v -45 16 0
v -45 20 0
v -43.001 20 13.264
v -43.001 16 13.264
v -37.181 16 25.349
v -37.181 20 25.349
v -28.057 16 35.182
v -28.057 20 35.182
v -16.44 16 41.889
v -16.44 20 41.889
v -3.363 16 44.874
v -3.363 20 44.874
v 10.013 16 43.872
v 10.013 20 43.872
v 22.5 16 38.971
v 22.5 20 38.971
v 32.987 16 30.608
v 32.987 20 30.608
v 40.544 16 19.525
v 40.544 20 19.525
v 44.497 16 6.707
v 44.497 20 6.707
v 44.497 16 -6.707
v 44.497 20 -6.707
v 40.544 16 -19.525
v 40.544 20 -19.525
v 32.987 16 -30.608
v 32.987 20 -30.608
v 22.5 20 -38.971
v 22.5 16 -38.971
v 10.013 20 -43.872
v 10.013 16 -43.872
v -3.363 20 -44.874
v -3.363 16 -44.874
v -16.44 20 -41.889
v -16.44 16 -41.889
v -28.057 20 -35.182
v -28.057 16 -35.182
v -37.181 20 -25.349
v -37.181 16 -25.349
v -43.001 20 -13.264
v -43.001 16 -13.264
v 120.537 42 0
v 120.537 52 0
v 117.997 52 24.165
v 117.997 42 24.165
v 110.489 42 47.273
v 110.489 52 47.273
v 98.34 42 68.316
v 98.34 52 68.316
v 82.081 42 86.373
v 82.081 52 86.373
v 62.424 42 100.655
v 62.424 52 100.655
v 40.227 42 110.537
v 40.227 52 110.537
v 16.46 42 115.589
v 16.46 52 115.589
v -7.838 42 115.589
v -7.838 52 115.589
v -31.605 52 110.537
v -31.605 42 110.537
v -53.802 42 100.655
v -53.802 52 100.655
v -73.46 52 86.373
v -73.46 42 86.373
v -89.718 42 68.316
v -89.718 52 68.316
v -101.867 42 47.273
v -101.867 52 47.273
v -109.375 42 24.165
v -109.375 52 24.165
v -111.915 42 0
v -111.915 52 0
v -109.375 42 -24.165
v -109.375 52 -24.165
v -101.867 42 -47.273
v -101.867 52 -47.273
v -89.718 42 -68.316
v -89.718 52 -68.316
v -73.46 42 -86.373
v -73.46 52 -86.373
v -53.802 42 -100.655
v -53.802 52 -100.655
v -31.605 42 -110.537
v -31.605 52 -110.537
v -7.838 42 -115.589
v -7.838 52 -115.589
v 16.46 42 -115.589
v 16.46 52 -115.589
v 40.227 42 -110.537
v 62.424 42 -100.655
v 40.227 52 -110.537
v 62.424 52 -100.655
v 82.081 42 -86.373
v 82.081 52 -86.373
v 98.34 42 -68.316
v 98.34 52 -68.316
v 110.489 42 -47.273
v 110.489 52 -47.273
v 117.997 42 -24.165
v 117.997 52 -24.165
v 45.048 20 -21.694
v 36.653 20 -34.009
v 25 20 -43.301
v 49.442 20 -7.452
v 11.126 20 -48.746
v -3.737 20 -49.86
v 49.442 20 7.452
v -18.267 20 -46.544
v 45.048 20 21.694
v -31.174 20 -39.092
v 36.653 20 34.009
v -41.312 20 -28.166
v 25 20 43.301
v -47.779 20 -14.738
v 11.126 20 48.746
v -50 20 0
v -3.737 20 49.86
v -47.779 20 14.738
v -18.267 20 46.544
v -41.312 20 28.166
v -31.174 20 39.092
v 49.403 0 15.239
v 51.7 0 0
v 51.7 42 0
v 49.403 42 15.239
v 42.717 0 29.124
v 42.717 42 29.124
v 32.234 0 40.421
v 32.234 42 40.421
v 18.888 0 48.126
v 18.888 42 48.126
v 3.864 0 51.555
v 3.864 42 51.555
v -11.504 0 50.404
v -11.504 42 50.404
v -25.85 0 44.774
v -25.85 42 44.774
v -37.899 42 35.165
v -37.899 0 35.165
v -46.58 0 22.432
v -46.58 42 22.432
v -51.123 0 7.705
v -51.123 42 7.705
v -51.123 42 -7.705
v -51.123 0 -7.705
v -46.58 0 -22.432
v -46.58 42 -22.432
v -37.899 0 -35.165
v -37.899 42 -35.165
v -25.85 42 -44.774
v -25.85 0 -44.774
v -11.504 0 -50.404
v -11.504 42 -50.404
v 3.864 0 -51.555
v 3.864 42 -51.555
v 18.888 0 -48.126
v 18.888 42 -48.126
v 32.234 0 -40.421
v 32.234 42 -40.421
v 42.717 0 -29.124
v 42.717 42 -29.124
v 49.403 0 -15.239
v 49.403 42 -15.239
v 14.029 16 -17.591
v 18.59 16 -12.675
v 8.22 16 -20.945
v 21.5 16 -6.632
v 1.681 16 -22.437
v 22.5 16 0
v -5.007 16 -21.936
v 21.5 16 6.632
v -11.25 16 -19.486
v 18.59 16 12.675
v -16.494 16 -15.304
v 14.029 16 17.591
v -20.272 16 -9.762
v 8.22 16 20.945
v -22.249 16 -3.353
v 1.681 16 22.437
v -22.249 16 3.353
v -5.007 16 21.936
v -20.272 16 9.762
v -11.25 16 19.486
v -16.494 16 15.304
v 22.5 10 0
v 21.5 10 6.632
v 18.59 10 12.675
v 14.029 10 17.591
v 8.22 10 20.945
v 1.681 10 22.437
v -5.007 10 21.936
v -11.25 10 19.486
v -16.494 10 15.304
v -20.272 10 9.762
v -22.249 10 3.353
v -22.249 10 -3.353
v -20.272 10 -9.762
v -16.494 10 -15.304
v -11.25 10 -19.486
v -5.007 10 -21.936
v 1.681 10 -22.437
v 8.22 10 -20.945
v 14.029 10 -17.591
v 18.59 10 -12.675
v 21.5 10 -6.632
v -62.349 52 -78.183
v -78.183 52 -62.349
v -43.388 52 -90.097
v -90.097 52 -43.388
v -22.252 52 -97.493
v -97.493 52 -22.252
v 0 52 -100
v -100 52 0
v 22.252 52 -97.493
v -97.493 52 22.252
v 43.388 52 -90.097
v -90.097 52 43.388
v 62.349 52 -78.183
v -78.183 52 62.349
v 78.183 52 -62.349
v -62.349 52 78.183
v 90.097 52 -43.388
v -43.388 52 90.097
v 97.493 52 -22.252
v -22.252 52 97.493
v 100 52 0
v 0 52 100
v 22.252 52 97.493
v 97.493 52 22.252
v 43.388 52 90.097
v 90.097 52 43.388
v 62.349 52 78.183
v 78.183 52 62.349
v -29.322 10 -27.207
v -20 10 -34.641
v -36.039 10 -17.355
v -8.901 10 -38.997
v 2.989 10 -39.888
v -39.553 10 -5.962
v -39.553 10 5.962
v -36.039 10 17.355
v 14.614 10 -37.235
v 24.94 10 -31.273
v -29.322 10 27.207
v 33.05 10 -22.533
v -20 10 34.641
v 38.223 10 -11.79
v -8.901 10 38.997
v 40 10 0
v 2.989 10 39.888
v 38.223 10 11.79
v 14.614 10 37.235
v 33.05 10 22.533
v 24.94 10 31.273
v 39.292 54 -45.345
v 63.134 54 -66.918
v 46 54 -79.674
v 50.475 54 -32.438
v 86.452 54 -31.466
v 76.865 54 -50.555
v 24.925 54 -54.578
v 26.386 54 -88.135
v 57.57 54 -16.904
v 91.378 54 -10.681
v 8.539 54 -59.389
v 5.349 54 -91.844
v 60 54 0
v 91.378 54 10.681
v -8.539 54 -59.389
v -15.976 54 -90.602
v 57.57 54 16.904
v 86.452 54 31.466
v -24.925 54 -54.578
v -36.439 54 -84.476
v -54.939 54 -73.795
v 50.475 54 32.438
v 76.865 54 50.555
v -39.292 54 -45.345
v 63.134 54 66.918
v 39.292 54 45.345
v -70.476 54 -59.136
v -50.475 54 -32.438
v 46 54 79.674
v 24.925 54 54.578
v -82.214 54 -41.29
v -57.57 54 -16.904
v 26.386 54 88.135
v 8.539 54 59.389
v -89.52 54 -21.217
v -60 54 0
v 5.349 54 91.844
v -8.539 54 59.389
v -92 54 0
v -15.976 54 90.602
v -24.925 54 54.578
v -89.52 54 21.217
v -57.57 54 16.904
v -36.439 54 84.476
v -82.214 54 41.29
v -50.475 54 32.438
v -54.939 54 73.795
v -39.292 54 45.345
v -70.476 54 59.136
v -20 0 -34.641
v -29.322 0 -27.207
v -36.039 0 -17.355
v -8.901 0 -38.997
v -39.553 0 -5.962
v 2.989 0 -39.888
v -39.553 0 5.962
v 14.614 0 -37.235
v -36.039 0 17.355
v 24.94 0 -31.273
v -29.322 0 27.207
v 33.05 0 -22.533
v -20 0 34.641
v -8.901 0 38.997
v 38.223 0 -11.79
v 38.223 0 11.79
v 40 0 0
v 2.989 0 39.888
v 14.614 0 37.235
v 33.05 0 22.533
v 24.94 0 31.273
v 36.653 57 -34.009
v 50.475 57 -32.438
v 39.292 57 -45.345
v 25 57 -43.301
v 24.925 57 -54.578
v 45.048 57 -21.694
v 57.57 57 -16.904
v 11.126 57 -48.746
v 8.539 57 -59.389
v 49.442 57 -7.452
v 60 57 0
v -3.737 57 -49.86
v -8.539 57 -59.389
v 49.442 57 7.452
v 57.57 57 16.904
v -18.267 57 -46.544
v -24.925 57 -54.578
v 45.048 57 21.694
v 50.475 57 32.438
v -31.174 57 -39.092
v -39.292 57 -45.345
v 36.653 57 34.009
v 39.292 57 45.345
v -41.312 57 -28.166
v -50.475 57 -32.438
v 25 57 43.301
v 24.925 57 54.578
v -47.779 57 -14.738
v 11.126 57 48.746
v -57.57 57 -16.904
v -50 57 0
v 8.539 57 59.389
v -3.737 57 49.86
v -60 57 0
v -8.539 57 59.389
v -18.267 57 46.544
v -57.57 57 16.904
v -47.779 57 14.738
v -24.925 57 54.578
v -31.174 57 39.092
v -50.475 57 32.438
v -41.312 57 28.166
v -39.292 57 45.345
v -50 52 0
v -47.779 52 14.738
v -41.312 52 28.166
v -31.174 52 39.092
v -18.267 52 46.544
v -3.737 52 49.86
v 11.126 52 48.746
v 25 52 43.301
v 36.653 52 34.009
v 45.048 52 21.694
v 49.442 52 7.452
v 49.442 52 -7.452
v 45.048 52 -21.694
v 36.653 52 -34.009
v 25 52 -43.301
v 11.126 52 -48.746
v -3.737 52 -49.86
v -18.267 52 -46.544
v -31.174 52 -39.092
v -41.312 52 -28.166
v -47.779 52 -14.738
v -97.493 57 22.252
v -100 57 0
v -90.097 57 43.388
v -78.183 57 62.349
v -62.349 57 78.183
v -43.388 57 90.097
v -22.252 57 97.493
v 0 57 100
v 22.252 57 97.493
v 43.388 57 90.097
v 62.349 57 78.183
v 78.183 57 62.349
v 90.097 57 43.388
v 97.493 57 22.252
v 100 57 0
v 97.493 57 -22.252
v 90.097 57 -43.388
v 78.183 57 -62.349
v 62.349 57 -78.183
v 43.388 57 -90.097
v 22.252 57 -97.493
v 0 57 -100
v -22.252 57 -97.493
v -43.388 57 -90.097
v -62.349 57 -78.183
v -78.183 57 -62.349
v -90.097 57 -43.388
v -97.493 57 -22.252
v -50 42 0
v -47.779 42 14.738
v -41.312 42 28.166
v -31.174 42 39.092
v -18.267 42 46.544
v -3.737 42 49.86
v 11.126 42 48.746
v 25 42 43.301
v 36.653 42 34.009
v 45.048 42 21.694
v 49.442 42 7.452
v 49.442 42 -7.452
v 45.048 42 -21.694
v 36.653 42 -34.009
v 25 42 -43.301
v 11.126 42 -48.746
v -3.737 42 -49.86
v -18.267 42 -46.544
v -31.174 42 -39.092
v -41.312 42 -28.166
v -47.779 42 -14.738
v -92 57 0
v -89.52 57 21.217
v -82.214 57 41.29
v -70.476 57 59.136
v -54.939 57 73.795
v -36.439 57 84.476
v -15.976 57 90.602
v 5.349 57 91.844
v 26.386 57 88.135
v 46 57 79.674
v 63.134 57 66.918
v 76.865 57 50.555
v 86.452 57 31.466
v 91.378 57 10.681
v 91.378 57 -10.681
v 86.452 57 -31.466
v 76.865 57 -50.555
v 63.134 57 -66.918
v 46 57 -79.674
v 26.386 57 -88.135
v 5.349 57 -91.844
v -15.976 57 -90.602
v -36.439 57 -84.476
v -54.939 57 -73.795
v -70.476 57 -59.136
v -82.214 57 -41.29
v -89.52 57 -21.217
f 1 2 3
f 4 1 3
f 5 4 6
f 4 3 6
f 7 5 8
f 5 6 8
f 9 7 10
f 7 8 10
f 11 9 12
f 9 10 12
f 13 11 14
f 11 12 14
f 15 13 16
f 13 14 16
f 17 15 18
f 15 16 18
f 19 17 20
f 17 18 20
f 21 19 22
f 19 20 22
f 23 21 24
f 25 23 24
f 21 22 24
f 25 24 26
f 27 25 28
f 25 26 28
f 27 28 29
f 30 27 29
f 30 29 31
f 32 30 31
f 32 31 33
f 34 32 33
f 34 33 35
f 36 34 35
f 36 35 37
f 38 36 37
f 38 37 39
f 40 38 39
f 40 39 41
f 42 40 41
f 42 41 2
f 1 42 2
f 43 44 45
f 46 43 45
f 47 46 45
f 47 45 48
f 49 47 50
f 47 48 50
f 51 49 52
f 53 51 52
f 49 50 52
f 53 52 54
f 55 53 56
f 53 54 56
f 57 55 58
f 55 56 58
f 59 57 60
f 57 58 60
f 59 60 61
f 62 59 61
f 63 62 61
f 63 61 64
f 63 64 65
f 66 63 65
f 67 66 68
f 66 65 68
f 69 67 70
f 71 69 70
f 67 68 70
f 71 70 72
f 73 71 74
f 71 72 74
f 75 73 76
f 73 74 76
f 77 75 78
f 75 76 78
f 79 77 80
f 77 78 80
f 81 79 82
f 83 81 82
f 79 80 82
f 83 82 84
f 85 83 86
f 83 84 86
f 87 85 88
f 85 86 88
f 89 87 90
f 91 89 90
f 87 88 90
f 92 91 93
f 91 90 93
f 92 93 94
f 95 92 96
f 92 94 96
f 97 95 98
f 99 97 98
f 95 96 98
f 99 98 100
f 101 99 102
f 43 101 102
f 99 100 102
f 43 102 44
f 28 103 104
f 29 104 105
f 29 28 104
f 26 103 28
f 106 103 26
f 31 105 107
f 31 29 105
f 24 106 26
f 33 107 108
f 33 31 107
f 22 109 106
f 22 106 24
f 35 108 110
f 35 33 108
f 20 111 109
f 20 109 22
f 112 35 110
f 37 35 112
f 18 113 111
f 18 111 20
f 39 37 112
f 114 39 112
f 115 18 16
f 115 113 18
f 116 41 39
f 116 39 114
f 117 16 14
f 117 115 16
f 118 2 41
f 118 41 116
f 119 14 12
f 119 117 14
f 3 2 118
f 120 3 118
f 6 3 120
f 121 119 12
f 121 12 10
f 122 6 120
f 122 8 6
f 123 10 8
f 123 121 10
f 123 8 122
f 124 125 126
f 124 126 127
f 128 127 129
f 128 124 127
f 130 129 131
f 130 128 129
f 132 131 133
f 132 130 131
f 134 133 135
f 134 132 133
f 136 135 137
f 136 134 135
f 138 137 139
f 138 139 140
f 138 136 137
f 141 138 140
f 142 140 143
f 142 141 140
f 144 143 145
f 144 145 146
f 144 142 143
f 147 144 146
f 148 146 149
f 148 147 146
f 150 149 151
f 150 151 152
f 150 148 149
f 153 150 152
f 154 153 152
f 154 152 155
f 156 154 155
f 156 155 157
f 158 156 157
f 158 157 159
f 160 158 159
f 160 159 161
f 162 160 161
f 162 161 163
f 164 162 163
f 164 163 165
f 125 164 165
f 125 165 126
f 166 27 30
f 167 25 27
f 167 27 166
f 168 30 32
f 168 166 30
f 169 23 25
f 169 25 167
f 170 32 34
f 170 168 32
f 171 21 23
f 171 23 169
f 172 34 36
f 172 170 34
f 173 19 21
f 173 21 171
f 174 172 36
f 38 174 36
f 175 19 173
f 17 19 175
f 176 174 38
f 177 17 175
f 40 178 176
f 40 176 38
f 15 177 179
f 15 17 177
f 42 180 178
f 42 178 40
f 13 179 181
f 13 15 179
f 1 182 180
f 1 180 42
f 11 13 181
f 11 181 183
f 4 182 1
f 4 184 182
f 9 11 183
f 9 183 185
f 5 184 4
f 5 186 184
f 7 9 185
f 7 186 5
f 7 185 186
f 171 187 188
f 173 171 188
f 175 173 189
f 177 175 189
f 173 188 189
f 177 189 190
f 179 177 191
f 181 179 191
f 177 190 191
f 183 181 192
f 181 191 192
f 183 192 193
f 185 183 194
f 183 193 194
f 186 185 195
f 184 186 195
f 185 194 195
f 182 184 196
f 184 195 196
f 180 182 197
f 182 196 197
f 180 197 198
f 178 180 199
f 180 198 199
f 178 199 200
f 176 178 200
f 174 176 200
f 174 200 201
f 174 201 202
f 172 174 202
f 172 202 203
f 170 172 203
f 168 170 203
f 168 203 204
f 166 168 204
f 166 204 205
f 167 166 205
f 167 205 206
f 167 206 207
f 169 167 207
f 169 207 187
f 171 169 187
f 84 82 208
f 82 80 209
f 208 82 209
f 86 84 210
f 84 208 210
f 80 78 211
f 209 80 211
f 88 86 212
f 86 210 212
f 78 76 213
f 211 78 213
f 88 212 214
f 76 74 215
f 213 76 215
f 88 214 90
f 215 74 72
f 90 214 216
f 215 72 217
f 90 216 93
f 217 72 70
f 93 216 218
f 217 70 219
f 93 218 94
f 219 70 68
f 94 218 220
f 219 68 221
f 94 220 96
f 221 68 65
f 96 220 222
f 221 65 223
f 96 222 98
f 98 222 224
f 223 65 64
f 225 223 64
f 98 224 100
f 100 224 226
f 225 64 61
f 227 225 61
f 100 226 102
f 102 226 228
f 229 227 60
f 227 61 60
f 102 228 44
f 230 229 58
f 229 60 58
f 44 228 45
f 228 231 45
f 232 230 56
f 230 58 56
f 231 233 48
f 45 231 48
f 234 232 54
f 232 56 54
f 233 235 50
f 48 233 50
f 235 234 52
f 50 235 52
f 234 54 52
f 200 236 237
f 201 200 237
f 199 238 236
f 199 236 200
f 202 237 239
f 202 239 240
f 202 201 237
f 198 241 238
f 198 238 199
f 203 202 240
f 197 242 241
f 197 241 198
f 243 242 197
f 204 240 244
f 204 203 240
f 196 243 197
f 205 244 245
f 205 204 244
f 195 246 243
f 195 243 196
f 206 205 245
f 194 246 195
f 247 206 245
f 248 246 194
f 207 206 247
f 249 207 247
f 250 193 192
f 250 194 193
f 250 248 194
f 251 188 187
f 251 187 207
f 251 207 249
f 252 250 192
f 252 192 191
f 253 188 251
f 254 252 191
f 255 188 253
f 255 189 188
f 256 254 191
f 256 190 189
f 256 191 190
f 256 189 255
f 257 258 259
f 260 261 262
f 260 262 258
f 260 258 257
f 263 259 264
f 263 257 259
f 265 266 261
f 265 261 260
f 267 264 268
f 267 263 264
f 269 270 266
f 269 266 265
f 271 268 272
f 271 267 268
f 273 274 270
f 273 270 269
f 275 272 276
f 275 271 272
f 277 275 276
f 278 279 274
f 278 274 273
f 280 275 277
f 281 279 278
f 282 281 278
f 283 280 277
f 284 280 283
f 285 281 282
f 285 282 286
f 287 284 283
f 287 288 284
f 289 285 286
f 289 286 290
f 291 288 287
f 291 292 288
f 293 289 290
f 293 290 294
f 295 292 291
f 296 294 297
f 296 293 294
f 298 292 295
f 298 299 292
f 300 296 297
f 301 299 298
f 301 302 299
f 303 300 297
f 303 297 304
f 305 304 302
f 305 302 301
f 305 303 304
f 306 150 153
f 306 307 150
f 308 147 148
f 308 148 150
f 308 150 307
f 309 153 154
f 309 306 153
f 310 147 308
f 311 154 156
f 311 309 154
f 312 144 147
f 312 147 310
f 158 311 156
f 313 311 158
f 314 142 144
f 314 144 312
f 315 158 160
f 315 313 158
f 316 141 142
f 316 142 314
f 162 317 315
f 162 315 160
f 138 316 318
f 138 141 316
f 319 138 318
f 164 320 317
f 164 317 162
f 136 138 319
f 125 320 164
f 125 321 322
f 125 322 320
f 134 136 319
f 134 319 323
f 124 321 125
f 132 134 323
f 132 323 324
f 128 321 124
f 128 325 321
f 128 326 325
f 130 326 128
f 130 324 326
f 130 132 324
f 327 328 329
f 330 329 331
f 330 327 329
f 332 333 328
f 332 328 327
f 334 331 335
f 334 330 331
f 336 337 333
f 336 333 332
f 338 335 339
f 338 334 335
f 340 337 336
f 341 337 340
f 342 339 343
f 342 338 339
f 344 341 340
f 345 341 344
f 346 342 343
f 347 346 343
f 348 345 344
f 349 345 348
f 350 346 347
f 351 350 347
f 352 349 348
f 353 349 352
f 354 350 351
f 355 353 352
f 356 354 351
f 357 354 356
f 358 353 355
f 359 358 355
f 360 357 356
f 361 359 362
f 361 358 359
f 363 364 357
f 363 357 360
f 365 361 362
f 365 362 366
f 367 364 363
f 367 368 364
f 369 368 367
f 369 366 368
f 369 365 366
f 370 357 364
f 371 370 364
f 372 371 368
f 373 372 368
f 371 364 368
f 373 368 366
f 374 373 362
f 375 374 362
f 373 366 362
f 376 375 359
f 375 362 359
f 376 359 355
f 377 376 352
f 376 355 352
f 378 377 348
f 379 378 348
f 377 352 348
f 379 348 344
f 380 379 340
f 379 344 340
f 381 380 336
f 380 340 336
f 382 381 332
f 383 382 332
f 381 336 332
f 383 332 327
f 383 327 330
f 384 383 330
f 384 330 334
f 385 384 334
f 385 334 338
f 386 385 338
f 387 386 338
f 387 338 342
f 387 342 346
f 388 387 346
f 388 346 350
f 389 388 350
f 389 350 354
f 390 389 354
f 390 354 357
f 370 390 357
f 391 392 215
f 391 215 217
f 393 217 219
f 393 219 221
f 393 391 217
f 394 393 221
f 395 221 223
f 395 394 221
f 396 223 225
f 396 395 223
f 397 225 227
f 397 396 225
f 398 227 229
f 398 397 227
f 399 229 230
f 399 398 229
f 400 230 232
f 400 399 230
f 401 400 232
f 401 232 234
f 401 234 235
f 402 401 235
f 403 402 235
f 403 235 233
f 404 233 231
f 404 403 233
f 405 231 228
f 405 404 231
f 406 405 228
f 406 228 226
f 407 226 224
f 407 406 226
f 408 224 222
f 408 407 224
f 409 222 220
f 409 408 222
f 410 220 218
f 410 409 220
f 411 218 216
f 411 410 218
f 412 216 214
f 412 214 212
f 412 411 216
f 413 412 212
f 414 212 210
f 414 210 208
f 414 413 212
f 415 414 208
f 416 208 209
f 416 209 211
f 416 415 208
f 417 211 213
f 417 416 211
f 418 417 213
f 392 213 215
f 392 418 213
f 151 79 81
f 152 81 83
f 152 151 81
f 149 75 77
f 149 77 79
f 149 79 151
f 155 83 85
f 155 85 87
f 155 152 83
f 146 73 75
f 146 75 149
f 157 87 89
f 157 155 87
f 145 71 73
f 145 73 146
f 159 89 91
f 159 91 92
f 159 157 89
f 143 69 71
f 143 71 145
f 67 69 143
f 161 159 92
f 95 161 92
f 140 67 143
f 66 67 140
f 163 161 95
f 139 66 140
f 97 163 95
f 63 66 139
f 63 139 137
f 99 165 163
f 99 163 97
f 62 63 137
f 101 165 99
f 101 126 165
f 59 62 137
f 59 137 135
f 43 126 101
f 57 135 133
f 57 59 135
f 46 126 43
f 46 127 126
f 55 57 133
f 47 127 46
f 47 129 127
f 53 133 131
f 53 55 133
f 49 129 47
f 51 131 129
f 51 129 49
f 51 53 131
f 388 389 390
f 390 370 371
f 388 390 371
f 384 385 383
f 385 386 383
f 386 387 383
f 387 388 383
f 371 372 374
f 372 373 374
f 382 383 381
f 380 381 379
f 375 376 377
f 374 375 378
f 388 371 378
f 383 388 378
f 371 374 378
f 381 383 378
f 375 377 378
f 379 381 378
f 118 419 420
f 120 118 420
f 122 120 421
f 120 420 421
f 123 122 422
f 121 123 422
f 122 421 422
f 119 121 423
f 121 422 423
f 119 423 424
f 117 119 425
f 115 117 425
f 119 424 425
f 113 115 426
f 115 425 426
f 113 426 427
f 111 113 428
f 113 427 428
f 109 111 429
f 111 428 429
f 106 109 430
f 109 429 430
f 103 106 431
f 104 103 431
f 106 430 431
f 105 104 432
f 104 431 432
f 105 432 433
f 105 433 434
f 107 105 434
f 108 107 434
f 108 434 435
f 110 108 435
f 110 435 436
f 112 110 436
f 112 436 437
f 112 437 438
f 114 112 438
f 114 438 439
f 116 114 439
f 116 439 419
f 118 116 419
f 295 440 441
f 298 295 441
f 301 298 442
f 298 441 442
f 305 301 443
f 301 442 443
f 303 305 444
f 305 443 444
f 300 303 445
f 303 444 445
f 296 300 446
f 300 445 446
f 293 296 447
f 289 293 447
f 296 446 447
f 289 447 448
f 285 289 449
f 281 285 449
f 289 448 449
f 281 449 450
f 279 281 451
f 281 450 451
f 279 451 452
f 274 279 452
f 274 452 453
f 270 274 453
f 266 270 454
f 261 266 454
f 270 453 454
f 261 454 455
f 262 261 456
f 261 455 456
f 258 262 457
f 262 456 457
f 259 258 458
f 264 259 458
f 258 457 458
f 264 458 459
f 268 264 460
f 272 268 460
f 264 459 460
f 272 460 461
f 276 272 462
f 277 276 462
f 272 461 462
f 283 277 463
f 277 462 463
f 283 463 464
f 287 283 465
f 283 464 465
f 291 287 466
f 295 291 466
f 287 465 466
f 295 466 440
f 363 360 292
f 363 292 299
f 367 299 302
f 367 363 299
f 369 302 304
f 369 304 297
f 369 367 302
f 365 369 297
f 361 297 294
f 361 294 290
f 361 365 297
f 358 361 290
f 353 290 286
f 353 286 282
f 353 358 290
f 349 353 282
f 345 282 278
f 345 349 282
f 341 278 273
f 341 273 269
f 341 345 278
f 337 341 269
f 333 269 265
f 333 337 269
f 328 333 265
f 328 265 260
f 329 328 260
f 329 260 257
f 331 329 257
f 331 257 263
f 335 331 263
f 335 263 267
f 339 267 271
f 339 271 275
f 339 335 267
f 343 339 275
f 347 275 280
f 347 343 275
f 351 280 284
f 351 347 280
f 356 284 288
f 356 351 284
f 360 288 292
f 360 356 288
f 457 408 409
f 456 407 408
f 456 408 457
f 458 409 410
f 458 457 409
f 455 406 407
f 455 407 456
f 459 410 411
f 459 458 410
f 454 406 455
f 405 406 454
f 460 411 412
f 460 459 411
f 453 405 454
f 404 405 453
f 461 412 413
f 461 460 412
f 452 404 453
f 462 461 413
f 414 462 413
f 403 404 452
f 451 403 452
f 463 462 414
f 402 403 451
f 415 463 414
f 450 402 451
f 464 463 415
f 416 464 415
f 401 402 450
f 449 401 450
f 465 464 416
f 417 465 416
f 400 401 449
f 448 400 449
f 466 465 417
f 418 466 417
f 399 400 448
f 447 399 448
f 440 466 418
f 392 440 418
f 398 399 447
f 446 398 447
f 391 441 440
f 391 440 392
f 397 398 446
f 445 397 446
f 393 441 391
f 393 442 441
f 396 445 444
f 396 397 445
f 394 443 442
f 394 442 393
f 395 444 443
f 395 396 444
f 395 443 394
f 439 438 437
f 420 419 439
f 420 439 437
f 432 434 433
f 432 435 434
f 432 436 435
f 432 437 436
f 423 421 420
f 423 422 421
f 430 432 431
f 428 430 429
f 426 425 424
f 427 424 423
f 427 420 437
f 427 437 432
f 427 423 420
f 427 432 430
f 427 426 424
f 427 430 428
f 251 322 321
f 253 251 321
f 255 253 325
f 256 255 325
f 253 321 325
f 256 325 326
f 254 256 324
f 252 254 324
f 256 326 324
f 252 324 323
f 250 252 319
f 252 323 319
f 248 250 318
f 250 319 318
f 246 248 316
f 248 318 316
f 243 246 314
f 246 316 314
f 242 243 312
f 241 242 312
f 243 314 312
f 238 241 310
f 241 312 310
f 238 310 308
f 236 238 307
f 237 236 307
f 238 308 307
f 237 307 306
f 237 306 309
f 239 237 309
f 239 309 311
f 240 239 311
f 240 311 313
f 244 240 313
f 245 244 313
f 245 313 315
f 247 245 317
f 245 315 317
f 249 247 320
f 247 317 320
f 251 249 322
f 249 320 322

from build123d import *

# Parameters (mm, degrees)
F0_R      = 51.7
F0_R_2    = 40
F0_R_3    = 22.5
F1_DEPTH  = 57
F2_DEPTH  = 10
F3_DEPTH  = 16
F4_R      = 50
F4_R_2    = 45
F5_DEPTH  = 37
F6_DEPTH  = 41
F4_R_3    = 100
F4_R_4    = 92
F4_R_5    = 60
F4_R_6    = 51.7
F7_DEPTH  = 5
F8_DEPTH  = 3
F9_R      = 116.2259856664
F10_DEPTH = 10


# Not quite as in the source:
# - a feature names something its author has since deleted; it is built from what else it names


with BuildPart() as f1:
    # F0 (on Front) → F1 (new body)
    with BuildSketch(Plane.XZ):
        Circle(F0_R)
        Circle(F0_R_2, mode=Mode.SUBTRACT)
        Circle(F0_R_2)
        Circle(F0_R_3, mode=Mode.SUBTRACT)
        Circle(F0_R_3)
    extrude(amount=-F1_DEPTH)

    # F0 (on Front) → F2 (cut)
    with BuildSketch(Plane.XZ):
        Circle(F0_R_2)
        Circle(F0_R_3, mode=Mode.SUBTRACT)
    extrude(amount=-F2_DEPTH, mode=Mode.SUBTRACT)

    # F0 (on Front) → F3 (cut)
    with BuildSketch(Plane.XZ):
        Circle(F0_R_3)
    extrude(amount=-F3_DEPTH, mode=Mode.SUBTRACT)

    # F4 (on face) → F5 (cut)
    with BuildSketch(Plane(origin=(0, 57, 0), x_dir=(-1, 0, 0), z_dir=(0, 1, 0))):
        Circle(F4_R)
        Circle(F4_R_2, mode=Mode.SUBTRACT)
    extrude(amount=-F5_DEPTH, mode=Mode.SUBTRACT)

    # F4 (on face) → F6 (cut)
    with BuildSketch(Plane(origin=(0, 57, 0), x_dir=(-1, 0, 0), z_dir=(0, 1, 0))):
        Circle(F4_R_2)
    extrude(amount=-F6_DEPTH, mode=Mode.SUBTRACT)

    # F4 (on face) → F7 (join)
    with BuildSketch(Plane(origin=(0, 57, 0), x_dir=(-1, 0, 0), z_dir=(0, 1, 0))):
        Circle(F4_R_3)
        Circle(F4_R_4, mode=Mode.SUBTRACT)
        Circle(F4_R_4)
        Circle(F4_R_5, mode=Mode.SUBTRACT)
        Circle(F4_R_5)
        Circle(F4_R_6, mode=Mode.SUBTRACT)
    extrude(amount=-F7_DEPTH)

    # F4 (on face) → F8 (cut)
    with BuildSketch(Plane(origin=(0, 57, 0), x_dir=(-1, 0, 0), z_dir=(0, 1, 0))):
        Circle(F4_R_4)
        Circle(F4_R_5, mode=Mode.SUBTRACT)
    extrude(amount=-F8_DEPTH, mode=Mode.SUBTRACT)

    # F9 (on face) → F10 (join)
    with BuildSketch(Plane.XZ.offset(-52)):
        with Locations((4.3108635582, 0)):
            Circle(F9_R)
    extrude(amount=F10_DEPTH)


solid = f1.part
